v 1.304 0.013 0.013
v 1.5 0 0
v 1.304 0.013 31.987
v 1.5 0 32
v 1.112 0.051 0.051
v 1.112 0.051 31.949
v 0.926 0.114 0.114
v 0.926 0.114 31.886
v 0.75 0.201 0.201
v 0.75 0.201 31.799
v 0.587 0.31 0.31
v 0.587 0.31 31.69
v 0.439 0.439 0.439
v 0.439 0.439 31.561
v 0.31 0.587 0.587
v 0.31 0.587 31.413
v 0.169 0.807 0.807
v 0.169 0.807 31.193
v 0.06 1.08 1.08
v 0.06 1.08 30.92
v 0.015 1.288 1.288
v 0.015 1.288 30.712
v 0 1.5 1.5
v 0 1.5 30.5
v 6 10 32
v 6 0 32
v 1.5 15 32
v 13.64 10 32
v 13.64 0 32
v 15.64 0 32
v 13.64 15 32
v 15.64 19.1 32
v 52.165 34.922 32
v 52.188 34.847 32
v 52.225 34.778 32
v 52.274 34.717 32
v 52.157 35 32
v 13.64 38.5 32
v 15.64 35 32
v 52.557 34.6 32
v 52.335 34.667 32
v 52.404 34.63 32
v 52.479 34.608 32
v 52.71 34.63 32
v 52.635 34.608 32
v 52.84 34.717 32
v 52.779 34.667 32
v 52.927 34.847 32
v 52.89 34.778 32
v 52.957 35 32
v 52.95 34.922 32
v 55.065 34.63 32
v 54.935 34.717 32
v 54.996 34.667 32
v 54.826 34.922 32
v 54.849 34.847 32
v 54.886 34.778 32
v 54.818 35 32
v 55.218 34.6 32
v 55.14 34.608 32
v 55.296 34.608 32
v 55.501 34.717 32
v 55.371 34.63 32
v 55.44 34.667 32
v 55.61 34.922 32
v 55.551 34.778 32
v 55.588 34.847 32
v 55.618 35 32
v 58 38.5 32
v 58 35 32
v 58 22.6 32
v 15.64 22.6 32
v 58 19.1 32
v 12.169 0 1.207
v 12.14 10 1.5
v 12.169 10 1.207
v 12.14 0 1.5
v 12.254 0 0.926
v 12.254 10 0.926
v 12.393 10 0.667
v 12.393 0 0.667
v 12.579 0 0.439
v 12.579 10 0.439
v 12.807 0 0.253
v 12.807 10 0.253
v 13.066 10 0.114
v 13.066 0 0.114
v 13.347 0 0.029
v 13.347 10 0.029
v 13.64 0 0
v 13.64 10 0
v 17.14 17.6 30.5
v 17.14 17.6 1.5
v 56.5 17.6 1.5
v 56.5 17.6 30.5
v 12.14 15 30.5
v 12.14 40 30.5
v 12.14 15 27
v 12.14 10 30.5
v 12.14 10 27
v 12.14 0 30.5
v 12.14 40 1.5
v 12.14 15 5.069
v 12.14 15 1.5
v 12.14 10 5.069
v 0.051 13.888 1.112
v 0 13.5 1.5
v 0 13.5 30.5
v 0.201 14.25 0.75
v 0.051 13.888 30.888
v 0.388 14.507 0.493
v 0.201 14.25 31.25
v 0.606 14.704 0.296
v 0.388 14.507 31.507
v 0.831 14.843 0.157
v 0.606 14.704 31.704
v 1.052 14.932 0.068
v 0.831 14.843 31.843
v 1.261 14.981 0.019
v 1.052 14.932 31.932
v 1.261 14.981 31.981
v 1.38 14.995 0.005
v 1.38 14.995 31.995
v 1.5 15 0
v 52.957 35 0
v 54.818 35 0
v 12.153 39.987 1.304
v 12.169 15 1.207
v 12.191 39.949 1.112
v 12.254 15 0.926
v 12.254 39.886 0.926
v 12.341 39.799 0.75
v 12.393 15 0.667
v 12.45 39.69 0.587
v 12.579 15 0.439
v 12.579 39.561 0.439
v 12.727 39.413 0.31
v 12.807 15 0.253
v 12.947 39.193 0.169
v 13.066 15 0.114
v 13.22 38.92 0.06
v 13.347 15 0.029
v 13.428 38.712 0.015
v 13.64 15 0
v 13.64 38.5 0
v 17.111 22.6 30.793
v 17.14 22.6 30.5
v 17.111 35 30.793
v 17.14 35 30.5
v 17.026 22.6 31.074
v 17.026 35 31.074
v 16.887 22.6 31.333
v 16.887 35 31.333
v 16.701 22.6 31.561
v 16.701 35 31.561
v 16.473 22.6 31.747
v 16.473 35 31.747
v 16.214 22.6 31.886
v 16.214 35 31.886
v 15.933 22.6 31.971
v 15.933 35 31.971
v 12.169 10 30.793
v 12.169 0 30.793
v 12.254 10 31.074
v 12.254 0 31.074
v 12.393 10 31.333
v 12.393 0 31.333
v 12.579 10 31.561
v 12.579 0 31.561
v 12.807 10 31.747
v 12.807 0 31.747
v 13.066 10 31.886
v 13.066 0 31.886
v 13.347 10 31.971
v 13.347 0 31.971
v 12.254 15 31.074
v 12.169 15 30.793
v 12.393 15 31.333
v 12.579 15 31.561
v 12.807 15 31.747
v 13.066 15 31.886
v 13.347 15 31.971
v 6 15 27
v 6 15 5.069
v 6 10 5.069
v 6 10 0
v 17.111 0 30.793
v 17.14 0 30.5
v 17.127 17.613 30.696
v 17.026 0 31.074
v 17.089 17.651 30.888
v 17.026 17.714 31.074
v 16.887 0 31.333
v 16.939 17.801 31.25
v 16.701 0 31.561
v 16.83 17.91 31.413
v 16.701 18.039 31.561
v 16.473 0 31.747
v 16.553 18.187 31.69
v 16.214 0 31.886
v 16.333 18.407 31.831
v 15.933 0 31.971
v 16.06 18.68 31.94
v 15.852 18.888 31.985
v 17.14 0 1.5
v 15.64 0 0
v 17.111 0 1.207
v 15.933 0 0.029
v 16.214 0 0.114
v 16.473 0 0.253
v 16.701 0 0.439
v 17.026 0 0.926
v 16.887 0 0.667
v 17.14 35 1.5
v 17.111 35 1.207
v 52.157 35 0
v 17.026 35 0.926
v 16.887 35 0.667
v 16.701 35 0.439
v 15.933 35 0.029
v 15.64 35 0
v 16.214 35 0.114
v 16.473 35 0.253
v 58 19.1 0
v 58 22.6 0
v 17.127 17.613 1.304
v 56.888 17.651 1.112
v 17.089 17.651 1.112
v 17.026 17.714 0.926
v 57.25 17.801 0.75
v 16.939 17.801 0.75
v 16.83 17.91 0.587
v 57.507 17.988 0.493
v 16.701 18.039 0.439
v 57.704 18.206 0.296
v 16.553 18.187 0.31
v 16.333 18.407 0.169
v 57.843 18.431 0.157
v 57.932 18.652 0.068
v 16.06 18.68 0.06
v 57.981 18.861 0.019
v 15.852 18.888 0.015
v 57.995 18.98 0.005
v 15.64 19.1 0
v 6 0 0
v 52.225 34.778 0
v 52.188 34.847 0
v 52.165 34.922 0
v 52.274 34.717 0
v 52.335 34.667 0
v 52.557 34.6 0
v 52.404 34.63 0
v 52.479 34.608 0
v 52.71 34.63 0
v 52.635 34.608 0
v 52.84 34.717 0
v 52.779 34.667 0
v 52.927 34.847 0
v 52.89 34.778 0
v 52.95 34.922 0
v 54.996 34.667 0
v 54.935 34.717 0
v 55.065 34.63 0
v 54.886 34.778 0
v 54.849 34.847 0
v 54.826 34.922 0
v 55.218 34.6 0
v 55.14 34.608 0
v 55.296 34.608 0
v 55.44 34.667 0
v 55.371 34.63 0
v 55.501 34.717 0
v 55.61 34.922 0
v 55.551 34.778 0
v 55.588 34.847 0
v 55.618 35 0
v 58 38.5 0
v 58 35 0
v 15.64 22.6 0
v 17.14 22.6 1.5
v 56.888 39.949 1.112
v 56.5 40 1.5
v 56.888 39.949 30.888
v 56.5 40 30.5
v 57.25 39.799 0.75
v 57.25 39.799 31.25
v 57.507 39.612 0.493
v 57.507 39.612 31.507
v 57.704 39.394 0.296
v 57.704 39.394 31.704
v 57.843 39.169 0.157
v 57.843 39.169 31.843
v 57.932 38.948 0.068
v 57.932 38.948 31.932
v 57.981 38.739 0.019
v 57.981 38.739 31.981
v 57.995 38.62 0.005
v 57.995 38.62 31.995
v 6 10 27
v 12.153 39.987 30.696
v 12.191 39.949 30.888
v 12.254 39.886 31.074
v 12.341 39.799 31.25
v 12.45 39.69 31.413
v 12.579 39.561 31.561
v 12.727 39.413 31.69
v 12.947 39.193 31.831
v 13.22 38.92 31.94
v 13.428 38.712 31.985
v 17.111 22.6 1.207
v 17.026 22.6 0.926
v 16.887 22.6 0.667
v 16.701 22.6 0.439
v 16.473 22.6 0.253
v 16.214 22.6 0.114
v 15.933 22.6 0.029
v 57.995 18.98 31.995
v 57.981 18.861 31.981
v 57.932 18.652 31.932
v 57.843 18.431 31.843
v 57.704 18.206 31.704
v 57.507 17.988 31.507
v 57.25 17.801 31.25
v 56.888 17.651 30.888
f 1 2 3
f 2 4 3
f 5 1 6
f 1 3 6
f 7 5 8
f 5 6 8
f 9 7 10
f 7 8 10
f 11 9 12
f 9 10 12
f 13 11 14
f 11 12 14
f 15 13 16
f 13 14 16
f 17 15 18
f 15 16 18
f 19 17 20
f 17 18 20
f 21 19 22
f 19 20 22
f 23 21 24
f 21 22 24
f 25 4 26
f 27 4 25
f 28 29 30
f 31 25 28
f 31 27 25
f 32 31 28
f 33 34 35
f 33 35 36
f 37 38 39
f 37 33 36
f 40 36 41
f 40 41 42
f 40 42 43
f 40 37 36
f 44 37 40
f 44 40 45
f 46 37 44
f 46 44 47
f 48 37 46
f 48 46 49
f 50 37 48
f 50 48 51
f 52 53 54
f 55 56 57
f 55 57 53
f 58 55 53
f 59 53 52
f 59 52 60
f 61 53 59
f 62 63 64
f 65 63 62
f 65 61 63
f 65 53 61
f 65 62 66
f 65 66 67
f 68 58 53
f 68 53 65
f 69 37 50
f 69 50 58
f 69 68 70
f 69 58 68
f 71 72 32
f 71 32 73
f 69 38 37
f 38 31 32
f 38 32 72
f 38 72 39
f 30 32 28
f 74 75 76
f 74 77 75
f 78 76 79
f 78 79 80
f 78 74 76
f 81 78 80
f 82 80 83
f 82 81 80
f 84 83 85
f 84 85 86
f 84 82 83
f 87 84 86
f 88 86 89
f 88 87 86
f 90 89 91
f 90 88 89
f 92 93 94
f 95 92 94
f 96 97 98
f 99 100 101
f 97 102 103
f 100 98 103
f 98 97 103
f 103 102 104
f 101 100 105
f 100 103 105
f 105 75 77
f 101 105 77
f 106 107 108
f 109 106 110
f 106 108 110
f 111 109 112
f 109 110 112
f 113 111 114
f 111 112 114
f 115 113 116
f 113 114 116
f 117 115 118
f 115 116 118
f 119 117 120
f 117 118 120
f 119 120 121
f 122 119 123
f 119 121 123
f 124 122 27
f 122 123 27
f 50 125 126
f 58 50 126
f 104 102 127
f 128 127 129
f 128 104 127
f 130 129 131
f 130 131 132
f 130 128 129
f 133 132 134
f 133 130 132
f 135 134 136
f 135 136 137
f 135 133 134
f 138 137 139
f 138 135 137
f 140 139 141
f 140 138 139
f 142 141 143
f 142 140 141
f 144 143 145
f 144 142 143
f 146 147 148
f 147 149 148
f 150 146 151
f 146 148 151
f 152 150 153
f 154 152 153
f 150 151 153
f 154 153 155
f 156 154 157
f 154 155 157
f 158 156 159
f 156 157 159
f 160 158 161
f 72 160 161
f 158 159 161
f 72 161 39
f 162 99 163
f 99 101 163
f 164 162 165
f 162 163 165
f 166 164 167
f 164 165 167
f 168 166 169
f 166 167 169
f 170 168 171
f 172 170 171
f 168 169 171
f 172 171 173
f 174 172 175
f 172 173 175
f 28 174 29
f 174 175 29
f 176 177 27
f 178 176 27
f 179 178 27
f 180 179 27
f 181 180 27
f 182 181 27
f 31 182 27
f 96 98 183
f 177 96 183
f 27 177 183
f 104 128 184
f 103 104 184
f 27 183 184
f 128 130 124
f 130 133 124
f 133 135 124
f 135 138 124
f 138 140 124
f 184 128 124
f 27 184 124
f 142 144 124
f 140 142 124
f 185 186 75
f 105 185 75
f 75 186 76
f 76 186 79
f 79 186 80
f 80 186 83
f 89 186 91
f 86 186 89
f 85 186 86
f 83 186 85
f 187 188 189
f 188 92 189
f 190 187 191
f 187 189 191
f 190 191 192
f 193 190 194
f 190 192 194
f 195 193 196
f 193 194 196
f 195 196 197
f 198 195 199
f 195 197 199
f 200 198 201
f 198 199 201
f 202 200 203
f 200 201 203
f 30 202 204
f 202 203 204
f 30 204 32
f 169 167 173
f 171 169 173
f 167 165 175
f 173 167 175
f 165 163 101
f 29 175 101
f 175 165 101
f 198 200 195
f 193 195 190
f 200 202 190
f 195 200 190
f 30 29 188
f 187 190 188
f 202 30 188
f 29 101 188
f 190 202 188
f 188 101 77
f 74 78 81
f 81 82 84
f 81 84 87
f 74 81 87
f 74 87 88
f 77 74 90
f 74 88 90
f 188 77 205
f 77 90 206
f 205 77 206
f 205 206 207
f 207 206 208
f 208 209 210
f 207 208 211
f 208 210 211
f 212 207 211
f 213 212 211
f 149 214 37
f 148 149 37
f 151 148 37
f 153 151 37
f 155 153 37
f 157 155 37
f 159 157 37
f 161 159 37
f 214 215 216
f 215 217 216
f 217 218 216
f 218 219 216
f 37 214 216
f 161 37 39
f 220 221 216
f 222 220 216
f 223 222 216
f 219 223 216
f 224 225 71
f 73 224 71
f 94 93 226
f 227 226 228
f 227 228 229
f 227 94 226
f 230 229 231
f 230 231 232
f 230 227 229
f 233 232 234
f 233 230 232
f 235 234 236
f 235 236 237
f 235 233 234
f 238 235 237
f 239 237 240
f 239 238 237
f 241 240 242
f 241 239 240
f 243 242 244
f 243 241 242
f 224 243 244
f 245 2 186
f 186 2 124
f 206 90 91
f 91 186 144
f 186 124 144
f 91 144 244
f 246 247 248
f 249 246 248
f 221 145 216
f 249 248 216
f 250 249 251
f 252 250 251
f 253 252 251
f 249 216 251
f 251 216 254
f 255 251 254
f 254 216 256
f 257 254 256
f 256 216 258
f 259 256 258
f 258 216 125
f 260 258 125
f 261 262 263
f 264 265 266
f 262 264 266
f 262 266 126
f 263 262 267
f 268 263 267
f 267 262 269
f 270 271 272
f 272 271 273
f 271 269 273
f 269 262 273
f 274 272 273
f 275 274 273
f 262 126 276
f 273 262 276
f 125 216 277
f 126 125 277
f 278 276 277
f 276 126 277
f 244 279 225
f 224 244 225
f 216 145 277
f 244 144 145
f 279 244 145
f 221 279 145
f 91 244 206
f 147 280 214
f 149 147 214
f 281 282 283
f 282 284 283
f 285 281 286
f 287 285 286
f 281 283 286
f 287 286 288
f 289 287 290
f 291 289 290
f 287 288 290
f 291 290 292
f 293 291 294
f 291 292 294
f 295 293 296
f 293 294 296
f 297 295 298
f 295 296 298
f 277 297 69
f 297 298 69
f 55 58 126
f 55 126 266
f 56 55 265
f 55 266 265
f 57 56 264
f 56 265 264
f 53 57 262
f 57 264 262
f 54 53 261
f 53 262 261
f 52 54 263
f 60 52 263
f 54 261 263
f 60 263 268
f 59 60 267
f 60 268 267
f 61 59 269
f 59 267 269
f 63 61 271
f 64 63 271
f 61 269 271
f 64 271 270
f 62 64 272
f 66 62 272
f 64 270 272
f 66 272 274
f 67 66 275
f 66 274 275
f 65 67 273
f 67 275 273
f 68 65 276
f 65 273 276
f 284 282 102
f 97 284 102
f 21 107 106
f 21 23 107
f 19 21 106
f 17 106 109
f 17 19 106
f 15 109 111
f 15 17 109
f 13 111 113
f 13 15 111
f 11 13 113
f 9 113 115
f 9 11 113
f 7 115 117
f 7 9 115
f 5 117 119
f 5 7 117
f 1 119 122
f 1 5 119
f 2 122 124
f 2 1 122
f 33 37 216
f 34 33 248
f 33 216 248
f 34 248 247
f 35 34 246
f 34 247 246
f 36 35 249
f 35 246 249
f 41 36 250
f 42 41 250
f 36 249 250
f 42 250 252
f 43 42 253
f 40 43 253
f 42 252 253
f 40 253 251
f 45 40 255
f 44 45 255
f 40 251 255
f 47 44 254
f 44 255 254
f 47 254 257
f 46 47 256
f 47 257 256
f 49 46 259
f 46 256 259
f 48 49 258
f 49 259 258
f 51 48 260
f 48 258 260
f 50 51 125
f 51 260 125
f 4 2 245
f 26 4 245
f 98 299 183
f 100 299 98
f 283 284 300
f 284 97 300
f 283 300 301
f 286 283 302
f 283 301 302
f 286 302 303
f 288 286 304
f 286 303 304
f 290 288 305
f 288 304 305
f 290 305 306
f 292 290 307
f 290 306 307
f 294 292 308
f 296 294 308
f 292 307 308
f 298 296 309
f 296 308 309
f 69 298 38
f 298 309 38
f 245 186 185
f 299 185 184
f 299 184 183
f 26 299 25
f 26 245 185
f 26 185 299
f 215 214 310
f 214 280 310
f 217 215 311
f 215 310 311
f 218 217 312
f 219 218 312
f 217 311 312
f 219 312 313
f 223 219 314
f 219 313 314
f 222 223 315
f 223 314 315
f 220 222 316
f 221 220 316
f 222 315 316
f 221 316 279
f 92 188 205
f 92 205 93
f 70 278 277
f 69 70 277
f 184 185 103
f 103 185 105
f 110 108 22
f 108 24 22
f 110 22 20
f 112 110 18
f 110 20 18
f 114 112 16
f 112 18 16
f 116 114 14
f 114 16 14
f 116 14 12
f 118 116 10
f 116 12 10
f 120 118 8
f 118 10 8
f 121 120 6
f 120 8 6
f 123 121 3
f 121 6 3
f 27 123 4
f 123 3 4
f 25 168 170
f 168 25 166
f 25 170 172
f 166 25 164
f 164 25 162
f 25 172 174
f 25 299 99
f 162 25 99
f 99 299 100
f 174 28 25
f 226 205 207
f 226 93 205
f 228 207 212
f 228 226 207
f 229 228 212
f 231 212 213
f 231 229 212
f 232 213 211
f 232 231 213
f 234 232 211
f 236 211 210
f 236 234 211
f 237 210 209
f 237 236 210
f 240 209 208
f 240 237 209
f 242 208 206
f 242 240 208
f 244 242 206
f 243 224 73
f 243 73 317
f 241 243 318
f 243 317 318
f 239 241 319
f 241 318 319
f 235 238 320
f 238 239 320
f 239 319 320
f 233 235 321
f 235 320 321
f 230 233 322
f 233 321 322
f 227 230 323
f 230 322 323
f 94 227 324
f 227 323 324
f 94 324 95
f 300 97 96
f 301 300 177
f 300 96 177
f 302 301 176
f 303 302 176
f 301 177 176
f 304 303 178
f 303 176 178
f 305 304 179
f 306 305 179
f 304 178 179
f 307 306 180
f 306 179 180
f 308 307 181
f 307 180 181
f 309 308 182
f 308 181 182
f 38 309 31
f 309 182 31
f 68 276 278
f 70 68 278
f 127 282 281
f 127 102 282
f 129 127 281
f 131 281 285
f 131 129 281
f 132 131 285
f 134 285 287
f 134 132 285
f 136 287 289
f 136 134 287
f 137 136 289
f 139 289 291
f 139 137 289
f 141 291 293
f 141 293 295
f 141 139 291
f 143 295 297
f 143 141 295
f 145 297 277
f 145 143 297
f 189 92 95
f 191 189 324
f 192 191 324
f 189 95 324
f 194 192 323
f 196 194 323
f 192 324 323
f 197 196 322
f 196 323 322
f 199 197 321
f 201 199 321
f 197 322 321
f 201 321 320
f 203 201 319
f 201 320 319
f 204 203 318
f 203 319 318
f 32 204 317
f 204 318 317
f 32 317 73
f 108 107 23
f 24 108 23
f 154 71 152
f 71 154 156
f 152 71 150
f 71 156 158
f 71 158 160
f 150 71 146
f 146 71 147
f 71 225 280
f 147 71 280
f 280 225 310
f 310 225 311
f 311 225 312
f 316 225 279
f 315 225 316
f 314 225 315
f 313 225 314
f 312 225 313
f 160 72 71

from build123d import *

# Parameters (mm, degrees)
F0_W     = 6.14
F0_H     = 5
F1_DEPTH = 32
F2_W     = 6.14
F2_H     = 21.9306324124
F3_DEPTH = 5
F4_DEPTH = 7.4
F5_DEPTH = 7.4
F6_R     = 1.5


with BuildPart() as f1:
    # F0 (on Top) → F1 (new body)
    with BuildSketch(Plane.XY):
        Polygon((0, 15), (0, 0), (6, 0), (6, 10), (6, 15), align=None)
        with Locations((9.07, 12.5)):
            Rectangle(F0_W, F0_H)
        Polygon((12.14, 15), (12.14, 10), (12.14, 0), (17.14, 0), (17.14, 25), (58, 25), (58, 30), (17.14, 30), (17.14, 35), (52.157233721, 35), (52.957233721, 35), (54.8181005478, 35), (55.6181005478, 35), (58, 35), (58, 40), (12.14, 40), (12.14, 25), align=None)
        with BuildLine():
            ThreePointArc((54.8181005478, 35), (55.2181005478, 34.6), (55.6181005478, 35))
            Line((55.6181005478, 35), (54.8181005478, 35))
        make_face()
        with BuildLine():
            ThreePointArc((52.157233721, 35), (52.557233721, 34.6), (52.957233721, 35))
            Line((52.957233721, 35), (52.157233721, 35))
        make_face()
    extrude(amount=F1_DEPTH)

    # F2 (on face) → F3 (cut)
    with BuildSketch(Plane.XZ.offset(-10)):
        with Locations((9.07, 16.0346837938)):
            Rectangle(F2_W, F2_H)
    extrude(amount=-F3_DEPTH, mode=Mode.SUBTRACT)

    # F4 (add): a face of the model
    f4_faces = [f1.faces().sort_by_distance(p)[0] for p in [
        (37.57, 25, 16),
    ]]
    extrude(f4_faces, amount=F4_DEPTH)

    # F5 (cut): a face of the model
    f5_faces = [f1.faces().sort_by_distance(p)[0] for p in [
        (37.57, 30, 16),
    ]]
    extrude(f5_faces, amount=-F5_DEPTH, mode=Mode.SUBTRACT)

    # F6
    f6_edges = [f1.edges().sort_by_distance(p)[0] for p in [
        (12.14, 5, 32),
        (12.14, 27.5, 32),
        (12.14, 5, 0),
        (12.14, 27.5, 0),
        (0, 15, 16),
        (0, 0, 16),
        (0, 7.5, 0),
        (0, 7.5, 32),
        (17.14, 8.8, 0),
        (17.14, 28.8, 0),
        (17.14, 28.8, 32),
        (17.14, 8.8, 32),
        (37.57, 17.6, 32),
        (37.57, 17.6, 0),
        (35.07, 40, 0),
        (35.07, 40, 32),
        (58, 40, 16),
        (58, 17.6, 16),
    ]]
    fillet(f6_edges, radius=F6_R)


solid = f1.part
